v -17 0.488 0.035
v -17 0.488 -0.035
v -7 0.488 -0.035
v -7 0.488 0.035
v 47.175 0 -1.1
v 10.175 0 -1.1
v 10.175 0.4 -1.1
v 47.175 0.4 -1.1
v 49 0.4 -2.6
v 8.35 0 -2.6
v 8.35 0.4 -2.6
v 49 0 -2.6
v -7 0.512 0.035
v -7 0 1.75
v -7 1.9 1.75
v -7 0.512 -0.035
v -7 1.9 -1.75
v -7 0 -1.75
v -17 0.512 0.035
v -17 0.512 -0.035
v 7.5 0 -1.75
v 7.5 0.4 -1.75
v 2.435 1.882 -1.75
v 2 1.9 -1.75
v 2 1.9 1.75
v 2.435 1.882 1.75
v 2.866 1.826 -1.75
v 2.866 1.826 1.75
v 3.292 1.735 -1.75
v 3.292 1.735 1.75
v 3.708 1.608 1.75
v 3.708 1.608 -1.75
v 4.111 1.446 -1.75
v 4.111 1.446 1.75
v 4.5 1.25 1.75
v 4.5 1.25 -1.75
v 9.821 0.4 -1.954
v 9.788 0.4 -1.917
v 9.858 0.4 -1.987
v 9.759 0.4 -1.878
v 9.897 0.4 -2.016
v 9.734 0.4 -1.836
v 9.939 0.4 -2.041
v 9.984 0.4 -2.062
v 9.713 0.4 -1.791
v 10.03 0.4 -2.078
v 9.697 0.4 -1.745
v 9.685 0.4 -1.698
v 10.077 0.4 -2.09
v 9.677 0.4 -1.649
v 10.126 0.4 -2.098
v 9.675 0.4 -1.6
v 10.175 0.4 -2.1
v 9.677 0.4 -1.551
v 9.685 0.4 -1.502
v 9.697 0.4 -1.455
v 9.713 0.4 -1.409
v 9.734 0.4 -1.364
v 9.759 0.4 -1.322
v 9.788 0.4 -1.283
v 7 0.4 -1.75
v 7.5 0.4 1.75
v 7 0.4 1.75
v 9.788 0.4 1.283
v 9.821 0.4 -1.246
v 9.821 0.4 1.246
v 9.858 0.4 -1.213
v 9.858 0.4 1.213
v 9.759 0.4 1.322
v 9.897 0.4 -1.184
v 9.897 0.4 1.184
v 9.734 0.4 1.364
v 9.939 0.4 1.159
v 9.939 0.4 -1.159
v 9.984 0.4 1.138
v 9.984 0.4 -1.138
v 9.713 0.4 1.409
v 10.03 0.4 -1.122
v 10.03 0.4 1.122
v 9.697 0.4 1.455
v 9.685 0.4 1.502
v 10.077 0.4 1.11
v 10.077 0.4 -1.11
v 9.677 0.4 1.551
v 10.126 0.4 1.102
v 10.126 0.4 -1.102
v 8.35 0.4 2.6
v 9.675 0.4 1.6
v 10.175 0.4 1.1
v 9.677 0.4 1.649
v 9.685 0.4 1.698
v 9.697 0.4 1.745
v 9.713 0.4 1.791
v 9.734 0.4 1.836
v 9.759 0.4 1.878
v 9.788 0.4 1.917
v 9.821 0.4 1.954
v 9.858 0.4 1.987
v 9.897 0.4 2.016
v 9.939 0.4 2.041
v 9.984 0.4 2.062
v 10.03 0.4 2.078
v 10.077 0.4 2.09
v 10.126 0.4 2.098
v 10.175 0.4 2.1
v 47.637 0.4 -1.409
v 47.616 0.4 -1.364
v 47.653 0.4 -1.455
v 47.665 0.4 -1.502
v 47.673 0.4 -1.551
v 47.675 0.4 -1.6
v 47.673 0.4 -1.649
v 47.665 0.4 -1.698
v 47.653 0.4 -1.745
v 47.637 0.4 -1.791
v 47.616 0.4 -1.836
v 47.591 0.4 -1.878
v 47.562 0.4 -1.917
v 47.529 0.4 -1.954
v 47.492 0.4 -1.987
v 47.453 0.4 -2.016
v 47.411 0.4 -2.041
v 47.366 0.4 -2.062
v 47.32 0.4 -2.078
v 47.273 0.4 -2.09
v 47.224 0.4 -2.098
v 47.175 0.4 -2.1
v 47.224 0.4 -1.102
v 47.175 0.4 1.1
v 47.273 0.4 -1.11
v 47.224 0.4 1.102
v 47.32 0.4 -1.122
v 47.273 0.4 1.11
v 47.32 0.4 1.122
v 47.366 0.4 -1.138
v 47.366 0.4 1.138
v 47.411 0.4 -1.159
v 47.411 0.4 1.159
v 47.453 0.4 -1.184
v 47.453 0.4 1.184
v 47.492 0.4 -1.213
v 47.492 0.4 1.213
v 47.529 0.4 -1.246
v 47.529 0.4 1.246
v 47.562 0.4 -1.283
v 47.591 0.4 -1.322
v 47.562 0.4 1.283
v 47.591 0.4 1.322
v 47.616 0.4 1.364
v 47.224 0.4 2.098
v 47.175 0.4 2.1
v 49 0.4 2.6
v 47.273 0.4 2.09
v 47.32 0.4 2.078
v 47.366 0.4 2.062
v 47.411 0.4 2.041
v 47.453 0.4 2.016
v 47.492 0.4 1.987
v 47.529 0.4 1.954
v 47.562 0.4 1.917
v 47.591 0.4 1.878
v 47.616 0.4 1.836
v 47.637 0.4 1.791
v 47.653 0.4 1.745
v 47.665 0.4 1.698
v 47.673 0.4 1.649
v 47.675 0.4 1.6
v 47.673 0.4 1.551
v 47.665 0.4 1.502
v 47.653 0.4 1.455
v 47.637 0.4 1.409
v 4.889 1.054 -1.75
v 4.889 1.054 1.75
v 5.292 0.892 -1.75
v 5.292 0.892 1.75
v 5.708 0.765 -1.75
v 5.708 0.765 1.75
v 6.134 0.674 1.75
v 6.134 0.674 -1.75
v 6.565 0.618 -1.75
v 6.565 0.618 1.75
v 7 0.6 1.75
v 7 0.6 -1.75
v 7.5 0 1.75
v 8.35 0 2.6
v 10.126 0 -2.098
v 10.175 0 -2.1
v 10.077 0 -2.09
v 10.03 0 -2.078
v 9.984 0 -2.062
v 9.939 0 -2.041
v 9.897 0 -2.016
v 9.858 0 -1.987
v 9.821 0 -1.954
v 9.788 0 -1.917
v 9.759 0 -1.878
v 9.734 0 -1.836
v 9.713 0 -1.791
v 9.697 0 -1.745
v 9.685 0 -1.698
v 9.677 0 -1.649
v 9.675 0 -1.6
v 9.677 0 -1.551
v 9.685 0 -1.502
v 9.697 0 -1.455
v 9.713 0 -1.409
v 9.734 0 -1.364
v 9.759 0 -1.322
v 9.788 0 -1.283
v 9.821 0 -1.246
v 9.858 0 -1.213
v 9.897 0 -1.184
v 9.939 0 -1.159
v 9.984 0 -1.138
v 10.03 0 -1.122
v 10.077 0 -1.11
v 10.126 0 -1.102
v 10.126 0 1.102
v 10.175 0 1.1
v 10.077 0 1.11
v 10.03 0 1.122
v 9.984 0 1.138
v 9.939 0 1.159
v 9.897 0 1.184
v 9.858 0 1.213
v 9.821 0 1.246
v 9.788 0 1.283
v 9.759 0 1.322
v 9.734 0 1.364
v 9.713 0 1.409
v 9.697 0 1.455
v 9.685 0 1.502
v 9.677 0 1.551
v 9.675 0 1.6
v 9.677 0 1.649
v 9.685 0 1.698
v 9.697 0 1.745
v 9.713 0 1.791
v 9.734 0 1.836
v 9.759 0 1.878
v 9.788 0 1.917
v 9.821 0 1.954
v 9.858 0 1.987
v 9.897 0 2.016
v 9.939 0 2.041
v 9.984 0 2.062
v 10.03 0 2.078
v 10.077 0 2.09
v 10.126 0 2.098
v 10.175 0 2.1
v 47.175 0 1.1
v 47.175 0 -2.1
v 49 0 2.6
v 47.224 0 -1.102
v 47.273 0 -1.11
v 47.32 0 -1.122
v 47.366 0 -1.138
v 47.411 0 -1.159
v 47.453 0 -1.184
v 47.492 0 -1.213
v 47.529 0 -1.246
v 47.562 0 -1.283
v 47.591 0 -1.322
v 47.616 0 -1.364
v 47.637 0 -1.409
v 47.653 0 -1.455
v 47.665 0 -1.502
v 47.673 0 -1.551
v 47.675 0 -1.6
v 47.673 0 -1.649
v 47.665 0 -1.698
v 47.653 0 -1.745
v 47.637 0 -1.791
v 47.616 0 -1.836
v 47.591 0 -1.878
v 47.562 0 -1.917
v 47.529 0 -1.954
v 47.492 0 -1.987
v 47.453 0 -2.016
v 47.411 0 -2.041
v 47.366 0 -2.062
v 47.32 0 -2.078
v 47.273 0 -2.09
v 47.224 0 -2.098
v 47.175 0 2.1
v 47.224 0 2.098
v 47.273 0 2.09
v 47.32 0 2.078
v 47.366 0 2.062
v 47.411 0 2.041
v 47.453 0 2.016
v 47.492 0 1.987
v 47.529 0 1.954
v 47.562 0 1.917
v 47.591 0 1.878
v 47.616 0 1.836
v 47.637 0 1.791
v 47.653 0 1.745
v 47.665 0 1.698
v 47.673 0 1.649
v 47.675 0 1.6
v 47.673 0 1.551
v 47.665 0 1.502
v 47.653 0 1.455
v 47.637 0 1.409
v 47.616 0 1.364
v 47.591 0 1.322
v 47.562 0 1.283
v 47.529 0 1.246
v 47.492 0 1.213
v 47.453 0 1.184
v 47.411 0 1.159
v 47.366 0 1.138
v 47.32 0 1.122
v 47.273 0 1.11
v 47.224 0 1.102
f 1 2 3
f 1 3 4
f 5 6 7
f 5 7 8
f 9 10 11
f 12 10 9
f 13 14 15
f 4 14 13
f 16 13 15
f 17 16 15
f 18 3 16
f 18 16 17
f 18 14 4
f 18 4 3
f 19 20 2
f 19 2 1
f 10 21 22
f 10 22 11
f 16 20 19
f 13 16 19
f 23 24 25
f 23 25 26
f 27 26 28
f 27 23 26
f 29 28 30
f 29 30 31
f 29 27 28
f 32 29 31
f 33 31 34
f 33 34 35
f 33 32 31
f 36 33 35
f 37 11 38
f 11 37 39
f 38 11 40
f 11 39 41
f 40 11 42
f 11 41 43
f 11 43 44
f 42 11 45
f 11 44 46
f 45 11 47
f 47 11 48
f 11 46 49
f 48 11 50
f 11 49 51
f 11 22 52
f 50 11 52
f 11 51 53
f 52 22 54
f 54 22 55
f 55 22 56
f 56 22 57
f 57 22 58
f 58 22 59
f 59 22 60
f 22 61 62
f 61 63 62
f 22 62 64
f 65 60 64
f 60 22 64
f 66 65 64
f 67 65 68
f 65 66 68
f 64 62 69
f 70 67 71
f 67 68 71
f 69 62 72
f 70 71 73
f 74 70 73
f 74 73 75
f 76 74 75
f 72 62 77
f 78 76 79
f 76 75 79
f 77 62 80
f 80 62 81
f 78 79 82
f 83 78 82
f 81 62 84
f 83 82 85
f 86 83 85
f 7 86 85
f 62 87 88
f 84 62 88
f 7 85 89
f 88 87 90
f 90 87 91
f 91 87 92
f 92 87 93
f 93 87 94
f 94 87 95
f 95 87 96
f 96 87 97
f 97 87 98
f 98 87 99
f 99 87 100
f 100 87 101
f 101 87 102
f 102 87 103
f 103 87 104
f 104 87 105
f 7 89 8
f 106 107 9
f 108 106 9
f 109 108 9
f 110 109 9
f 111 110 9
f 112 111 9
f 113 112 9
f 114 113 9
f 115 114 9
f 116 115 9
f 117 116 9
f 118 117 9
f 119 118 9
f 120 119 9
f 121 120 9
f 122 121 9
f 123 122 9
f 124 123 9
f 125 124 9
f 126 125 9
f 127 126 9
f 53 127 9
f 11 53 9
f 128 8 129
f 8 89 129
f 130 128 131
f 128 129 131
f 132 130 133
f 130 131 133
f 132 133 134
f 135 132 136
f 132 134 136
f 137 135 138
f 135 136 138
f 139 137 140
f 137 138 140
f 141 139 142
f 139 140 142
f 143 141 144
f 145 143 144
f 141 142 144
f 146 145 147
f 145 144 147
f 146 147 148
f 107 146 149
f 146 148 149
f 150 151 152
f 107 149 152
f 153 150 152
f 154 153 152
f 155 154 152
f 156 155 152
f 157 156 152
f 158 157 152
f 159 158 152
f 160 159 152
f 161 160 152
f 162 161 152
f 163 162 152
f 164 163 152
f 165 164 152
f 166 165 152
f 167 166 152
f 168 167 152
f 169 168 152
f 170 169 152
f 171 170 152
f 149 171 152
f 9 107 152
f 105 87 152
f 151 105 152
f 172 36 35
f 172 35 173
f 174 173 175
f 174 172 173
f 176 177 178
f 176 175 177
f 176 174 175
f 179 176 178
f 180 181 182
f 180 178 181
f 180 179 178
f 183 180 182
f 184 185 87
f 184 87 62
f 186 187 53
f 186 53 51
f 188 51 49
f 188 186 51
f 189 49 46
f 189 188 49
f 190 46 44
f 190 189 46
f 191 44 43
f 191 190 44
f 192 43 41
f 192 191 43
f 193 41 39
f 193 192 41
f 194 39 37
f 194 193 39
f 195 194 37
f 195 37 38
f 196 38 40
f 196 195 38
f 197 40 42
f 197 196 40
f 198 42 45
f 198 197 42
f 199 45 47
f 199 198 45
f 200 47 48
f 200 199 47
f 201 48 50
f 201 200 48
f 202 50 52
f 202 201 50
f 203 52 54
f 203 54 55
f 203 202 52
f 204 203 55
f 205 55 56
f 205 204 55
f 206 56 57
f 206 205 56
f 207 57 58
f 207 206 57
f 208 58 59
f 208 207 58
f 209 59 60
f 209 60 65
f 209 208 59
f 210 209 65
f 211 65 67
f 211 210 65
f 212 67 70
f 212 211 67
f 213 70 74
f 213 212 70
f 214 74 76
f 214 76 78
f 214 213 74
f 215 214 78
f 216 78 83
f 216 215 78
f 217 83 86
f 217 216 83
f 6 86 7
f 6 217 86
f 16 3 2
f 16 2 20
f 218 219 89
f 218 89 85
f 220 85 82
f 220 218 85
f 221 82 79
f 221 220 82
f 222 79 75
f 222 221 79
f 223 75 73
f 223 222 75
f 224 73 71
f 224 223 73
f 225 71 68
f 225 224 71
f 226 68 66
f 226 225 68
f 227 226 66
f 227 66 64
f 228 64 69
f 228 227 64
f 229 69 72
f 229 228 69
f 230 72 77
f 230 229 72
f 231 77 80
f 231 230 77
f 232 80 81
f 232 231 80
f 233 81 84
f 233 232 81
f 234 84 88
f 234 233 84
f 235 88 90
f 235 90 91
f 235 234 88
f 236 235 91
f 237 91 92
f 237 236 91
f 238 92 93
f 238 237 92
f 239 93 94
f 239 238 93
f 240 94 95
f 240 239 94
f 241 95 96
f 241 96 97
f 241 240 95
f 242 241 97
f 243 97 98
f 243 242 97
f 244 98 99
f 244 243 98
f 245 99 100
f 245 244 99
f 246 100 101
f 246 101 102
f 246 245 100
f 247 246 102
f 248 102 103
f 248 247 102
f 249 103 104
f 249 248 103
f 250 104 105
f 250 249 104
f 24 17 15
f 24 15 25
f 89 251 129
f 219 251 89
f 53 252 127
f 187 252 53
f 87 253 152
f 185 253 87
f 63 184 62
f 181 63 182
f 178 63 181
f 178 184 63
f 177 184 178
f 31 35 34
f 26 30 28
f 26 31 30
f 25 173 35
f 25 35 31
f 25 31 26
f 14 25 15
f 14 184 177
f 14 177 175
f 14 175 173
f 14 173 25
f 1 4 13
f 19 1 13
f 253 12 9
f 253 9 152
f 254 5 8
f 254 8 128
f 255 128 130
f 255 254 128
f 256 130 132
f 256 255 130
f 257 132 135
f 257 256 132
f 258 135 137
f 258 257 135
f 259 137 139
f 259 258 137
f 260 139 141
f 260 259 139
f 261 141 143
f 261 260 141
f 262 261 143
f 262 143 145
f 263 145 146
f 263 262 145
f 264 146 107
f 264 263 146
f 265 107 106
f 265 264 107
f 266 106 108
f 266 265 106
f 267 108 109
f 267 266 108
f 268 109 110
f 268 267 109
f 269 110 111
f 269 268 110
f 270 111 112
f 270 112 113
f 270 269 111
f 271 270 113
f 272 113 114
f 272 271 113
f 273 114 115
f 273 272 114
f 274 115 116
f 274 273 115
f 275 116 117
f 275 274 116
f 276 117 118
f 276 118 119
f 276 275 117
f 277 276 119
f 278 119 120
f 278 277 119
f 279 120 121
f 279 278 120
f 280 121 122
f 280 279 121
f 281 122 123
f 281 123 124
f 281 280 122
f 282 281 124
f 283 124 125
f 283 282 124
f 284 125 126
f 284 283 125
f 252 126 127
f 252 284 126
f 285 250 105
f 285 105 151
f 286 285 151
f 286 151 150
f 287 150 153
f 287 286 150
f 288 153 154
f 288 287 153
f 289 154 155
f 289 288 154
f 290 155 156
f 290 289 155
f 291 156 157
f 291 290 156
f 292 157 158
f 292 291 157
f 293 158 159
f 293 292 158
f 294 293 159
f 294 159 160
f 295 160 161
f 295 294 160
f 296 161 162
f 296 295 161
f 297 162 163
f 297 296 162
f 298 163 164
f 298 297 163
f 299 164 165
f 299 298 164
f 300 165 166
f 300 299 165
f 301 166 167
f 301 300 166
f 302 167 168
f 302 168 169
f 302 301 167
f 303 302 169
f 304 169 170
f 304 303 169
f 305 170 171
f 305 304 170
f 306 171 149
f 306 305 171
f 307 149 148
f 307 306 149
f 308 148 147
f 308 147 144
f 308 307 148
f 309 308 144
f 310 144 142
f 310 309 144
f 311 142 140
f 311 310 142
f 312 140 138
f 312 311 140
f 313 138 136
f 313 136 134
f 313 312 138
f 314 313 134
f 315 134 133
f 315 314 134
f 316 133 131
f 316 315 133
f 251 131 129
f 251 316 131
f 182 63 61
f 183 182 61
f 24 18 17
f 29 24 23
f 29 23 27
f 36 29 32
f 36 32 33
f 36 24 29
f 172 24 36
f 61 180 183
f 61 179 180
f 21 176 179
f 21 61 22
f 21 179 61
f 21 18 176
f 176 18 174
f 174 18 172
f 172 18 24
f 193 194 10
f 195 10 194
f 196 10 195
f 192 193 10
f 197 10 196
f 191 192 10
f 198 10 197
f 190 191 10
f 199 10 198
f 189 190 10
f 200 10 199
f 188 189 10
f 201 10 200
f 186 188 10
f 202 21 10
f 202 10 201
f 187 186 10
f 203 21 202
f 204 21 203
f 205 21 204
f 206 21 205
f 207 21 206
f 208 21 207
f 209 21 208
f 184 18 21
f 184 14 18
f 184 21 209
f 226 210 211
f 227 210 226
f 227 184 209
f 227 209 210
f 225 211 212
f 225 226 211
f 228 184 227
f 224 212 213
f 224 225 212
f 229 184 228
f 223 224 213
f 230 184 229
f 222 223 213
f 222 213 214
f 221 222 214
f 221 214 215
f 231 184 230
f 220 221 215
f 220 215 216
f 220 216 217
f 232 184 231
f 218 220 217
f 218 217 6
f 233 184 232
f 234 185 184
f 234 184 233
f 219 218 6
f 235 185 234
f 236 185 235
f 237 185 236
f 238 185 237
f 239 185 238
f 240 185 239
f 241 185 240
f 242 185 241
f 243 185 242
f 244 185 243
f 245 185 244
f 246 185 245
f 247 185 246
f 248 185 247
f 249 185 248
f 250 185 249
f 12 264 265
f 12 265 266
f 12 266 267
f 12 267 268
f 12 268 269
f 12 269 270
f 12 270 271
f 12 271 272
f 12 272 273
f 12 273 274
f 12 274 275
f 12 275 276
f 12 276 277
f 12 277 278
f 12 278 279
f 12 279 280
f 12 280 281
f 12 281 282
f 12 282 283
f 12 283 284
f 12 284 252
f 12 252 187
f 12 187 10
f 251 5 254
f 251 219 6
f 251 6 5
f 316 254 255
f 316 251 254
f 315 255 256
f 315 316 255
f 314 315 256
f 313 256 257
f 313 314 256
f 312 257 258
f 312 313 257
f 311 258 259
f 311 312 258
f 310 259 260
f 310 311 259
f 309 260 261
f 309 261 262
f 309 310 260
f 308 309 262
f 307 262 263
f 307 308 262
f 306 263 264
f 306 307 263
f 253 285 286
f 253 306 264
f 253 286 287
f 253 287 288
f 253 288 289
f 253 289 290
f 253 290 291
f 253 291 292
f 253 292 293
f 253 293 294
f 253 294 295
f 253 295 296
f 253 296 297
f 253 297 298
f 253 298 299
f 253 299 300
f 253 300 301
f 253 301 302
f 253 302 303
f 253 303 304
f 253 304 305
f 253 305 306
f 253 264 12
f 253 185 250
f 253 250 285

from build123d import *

# Parameters (mm, degrees)
SKETCH1_W               = 14
SKETCH1_H               = 3.5
BOSS_EXTRUDE1_DEPTH     = 1.9
BOSS_EXTRUDE2_DEPTH     = 0.4
CUT_EXTRUDE1_DEPTH      = 50.105702317
CUT_EXTRUDE1_DEPTH_BACK = 50.105702317
SKETCH4_W               = 0.07
SKETCH4_H               = 0.024
BOSS_EXTRUDE3_DEPTH     = 10


with BuildPart() as part:
    # Sketch1 → Boss-Extrude1 (new body)
    with BuildSketch(Plane(origin=(0, 0, 0), x_dir=(1, 0, 0), z_dir=(0, 1, 0))):
        Rectangle(SKETCH1_W, SKETCH1_H)
    extrude(amount=BOSS_EXTRUDE1_DEPTH)

    # Sketch2 → Boss-Extrude2 (add)
    with BuildSketch(Plane.XZ):
        Polygon((7, -1.75), (7.5, -1.75), (8.35, -2.6), (49, -2.6), (49, 2.6), (8.35, 2.6), (7.5, 1.75), (7, 1.75), align=None)
        with BuildLine():
            Line((47.175, 1.1), (10.175, 1.1))
            ThreePointArc((10.175, 1.1), (9.675, 1.6), (10.175, 2.1))
            Line((10.175, 2.1), (47.175, 2.1))
            ThreePointArc((47.175, 2.1), (47.675, 1.6), (47.175, 1.1))
        make_face(mode=Mode.SUBTRACT)
        with BuildLine():
            Line((47.175, -2.1), (10.175, -2.1))
            ThreePointArc((10.175, -2.1), (9.675, -1.6), (10.175, -1.1))
            Line((10.175, -1.1), (47.175, -1.1))
            ThreePointArc((47.175, -1.1), (47.675, -1.6), (47.175, -2.1))
        make_face(mode=Mode.SUBTRACT)
    extrude(amount=-BOSS_EXTRUDE2_DEPTH)

    # Sketch3 → Cut-Extrude1 (cut, two sides: drawn at the far end of the back side and taken through both)
    with BuildSketch(Plane.XY.offset(-CUT_EXTRUDE1_DEPTH_BACK)):
        with BuildLine():
            Line((7, 0.6), (7, 1.9))
            Line((7, 1.9), (2, 1.9))
            ThreePointArc((2, 1.9), (3.291559135, 1.734842828), (4.5, 1.25))
            ThreePointArc((4.5, 1.25), (5.708440865, 0.765157172), (7, 0.6))
        make_face()
    extrude(amount=CUT_EXTRUDE1_DEPTH + CUT_EXTRUDE1_DEPTH_BACK, mode=Mode.SUBTRACT)

    # Sketch4 → Boss-Extrude3 (add)
    with BuildSketch(Plane.ZY.offset(7)):
        with Locations((0, 0.5)):
            Rectangle(SKETCH4_W, SKETCH4_H)
    extrude(amount=BOSS_EXTRUDE3_DEPTH)


solid = part.part
